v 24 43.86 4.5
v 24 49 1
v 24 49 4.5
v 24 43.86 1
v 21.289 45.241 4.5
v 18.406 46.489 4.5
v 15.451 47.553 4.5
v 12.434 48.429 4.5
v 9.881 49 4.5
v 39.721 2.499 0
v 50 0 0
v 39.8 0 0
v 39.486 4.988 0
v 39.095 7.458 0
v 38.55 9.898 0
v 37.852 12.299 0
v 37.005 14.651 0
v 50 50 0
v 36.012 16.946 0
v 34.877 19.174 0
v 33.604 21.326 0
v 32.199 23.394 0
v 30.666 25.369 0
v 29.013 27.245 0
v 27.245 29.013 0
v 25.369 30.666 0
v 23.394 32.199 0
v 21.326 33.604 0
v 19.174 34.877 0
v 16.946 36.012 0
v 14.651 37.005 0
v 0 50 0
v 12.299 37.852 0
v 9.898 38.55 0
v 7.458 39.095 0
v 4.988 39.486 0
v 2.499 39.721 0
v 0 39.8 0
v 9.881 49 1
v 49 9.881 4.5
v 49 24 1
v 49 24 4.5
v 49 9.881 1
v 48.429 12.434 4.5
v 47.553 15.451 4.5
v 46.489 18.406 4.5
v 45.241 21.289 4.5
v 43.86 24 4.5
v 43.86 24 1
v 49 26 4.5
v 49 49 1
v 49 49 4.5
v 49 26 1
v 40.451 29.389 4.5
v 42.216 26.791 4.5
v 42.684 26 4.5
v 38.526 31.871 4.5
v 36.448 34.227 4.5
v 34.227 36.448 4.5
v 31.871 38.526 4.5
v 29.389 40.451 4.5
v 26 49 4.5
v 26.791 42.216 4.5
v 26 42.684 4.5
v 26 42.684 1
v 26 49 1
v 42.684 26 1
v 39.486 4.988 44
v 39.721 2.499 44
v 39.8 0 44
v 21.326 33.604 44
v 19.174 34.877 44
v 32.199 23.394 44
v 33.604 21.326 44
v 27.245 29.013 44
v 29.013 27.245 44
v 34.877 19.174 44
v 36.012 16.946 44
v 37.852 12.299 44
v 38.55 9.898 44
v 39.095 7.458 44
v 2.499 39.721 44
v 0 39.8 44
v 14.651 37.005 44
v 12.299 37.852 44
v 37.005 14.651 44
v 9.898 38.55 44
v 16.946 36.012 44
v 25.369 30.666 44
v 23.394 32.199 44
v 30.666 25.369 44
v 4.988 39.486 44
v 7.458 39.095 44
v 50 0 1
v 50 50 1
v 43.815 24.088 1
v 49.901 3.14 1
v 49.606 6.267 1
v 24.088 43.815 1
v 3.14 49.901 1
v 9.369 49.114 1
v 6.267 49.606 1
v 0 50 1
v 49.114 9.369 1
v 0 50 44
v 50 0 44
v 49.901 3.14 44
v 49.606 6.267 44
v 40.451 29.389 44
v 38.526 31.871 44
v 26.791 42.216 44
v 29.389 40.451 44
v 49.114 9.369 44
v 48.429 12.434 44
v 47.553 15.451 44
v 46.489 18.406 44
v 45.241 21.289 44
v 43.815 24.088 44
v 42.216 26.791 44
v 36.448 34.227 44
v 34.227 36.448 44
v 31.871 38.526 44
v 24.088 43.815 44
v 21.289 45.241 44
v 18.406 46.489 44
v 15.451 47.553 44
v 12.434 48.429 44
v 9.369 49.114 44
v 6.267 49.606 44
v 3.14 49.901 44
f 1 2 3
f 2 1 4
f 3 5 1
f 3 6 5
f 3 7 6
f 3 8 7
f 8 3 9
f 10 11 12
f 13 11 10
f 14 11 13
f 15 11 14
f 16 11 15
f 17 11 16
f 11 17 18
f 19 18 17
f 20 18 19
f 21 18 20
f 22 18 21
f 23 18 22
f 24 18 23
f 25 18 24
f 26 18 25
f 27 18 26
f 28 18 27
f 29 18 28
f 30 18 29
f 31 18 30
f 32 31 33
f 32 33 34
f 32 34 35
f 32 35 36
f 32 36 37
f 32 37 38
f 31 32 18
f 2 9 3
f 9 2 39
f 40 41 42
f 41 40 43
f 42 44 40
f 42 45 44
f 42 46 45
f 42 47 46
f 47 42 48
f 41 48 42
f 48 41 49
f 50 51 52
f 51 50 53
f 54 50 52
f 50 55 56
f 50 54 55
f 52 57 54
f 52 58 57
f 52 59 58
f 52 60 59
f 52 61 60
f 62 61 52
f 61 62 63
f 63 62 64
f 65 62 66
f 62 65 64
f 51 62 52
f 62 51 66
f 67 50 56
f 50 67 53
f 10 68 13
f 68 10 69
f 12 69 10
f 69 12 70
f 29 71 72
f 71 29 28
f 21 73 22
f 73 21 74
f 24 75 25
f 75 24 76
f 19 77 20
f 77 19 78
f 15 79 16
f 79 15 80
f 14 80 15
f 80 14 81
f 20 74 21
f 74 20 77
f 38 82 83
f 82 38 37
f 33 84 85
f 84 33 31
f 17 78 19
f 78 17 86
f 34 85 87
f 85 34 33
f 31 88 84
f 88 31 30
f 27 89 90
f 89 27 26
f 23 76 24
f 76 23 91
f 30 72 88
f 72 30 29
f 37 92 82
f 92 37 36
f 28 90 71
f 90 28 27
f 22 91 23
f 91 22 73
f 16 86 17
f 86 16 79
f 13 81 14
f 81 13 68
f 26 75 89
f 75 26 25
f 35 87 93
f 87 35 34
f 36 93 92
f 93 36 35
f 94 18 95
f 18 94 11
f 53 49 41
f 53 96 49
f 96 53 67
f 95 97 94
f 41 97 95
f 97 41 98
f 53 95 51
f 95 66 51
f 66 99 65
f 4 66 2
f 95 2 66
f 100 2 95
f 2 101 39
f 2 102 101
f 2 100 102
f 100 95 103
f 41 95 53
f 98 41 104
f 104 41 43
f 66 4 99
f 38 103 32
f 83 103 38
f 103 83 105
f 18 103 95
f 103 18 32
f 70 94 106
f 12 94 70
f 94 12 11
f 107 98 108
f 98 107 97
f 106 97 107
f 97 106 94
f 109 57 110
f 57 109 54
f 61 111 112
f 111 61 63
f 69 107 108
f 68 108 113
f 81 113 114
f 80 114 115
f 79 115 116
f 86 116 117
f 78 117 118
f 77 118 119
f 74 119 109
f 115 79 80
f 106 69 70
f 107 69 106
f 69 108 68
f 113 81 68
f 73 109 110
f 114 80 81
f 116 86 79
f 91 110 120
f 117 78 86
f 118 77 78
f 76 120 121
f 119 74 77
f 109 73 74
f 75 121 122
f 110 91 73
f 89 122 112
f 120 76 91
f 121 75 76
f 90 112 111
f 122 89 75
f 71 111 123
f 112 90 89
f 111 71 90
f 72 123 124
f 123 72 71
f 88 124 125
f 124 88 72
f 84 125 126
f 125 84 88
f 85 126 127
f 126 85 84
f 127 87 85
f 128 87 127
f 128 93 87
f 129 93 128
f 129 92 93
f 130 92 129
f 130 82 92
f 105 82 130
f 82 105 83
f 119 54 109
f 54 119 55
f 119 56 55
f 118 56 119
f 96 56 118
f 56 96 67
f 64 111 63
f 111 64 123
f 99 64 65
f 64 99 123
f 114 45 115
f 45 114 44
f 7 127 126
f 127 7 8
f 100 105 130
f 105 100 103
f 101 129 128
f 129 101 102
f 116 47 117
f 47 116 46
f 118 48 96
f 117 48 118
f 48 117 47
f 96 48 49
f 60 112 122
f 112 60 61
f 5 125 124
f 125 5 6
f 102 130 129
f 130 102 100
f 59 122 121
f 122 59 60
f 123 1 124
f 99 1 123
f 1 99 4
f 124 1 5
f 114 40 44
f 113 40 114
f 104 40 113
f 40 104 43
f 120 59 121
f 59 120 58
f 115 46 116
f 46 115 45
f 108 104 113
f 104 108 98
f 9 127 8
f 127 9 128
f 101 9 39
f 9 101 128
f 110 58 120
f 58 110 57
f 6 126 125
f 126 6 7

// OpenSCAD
_basis = 25;

module curved_concave(r=2, h=2) {
    color("LightGray") {
        difference () {
            union() {
                for (i = [0:r-1]) {
                    for (j = [0:r-1]) {
                        translate([_basis*i+1,_basis*j+1,0]) cube([23,23,4.5]);
                    }
                }

            }
            translate([0,0,-1]) cylinder(_basis*h,_basis*r-10.2,_basis*r-10.2, $fn=100);
        }
    }
    color("Grey") {
        difference() {
            cube([_basis*r,_basis*r,1]);
            translate([0,0,-1]) cylinder(_basis*h,_basis*r-10.2,_basis*r-10.2, $fn=100);
        }
        intersection() {
            difference() {
                cylinder(_basis*h-6,_basis*r,_basis*r, $fn=100);
                translate([0,0,-1]) cylinder(_basis*h+2,_basis*r-10.2,_basis*r-10.2, $fn=100);
            }
            cube([_basis*r,_basis*r,_basis*h]);
        }
    }
}

curved_concave();
